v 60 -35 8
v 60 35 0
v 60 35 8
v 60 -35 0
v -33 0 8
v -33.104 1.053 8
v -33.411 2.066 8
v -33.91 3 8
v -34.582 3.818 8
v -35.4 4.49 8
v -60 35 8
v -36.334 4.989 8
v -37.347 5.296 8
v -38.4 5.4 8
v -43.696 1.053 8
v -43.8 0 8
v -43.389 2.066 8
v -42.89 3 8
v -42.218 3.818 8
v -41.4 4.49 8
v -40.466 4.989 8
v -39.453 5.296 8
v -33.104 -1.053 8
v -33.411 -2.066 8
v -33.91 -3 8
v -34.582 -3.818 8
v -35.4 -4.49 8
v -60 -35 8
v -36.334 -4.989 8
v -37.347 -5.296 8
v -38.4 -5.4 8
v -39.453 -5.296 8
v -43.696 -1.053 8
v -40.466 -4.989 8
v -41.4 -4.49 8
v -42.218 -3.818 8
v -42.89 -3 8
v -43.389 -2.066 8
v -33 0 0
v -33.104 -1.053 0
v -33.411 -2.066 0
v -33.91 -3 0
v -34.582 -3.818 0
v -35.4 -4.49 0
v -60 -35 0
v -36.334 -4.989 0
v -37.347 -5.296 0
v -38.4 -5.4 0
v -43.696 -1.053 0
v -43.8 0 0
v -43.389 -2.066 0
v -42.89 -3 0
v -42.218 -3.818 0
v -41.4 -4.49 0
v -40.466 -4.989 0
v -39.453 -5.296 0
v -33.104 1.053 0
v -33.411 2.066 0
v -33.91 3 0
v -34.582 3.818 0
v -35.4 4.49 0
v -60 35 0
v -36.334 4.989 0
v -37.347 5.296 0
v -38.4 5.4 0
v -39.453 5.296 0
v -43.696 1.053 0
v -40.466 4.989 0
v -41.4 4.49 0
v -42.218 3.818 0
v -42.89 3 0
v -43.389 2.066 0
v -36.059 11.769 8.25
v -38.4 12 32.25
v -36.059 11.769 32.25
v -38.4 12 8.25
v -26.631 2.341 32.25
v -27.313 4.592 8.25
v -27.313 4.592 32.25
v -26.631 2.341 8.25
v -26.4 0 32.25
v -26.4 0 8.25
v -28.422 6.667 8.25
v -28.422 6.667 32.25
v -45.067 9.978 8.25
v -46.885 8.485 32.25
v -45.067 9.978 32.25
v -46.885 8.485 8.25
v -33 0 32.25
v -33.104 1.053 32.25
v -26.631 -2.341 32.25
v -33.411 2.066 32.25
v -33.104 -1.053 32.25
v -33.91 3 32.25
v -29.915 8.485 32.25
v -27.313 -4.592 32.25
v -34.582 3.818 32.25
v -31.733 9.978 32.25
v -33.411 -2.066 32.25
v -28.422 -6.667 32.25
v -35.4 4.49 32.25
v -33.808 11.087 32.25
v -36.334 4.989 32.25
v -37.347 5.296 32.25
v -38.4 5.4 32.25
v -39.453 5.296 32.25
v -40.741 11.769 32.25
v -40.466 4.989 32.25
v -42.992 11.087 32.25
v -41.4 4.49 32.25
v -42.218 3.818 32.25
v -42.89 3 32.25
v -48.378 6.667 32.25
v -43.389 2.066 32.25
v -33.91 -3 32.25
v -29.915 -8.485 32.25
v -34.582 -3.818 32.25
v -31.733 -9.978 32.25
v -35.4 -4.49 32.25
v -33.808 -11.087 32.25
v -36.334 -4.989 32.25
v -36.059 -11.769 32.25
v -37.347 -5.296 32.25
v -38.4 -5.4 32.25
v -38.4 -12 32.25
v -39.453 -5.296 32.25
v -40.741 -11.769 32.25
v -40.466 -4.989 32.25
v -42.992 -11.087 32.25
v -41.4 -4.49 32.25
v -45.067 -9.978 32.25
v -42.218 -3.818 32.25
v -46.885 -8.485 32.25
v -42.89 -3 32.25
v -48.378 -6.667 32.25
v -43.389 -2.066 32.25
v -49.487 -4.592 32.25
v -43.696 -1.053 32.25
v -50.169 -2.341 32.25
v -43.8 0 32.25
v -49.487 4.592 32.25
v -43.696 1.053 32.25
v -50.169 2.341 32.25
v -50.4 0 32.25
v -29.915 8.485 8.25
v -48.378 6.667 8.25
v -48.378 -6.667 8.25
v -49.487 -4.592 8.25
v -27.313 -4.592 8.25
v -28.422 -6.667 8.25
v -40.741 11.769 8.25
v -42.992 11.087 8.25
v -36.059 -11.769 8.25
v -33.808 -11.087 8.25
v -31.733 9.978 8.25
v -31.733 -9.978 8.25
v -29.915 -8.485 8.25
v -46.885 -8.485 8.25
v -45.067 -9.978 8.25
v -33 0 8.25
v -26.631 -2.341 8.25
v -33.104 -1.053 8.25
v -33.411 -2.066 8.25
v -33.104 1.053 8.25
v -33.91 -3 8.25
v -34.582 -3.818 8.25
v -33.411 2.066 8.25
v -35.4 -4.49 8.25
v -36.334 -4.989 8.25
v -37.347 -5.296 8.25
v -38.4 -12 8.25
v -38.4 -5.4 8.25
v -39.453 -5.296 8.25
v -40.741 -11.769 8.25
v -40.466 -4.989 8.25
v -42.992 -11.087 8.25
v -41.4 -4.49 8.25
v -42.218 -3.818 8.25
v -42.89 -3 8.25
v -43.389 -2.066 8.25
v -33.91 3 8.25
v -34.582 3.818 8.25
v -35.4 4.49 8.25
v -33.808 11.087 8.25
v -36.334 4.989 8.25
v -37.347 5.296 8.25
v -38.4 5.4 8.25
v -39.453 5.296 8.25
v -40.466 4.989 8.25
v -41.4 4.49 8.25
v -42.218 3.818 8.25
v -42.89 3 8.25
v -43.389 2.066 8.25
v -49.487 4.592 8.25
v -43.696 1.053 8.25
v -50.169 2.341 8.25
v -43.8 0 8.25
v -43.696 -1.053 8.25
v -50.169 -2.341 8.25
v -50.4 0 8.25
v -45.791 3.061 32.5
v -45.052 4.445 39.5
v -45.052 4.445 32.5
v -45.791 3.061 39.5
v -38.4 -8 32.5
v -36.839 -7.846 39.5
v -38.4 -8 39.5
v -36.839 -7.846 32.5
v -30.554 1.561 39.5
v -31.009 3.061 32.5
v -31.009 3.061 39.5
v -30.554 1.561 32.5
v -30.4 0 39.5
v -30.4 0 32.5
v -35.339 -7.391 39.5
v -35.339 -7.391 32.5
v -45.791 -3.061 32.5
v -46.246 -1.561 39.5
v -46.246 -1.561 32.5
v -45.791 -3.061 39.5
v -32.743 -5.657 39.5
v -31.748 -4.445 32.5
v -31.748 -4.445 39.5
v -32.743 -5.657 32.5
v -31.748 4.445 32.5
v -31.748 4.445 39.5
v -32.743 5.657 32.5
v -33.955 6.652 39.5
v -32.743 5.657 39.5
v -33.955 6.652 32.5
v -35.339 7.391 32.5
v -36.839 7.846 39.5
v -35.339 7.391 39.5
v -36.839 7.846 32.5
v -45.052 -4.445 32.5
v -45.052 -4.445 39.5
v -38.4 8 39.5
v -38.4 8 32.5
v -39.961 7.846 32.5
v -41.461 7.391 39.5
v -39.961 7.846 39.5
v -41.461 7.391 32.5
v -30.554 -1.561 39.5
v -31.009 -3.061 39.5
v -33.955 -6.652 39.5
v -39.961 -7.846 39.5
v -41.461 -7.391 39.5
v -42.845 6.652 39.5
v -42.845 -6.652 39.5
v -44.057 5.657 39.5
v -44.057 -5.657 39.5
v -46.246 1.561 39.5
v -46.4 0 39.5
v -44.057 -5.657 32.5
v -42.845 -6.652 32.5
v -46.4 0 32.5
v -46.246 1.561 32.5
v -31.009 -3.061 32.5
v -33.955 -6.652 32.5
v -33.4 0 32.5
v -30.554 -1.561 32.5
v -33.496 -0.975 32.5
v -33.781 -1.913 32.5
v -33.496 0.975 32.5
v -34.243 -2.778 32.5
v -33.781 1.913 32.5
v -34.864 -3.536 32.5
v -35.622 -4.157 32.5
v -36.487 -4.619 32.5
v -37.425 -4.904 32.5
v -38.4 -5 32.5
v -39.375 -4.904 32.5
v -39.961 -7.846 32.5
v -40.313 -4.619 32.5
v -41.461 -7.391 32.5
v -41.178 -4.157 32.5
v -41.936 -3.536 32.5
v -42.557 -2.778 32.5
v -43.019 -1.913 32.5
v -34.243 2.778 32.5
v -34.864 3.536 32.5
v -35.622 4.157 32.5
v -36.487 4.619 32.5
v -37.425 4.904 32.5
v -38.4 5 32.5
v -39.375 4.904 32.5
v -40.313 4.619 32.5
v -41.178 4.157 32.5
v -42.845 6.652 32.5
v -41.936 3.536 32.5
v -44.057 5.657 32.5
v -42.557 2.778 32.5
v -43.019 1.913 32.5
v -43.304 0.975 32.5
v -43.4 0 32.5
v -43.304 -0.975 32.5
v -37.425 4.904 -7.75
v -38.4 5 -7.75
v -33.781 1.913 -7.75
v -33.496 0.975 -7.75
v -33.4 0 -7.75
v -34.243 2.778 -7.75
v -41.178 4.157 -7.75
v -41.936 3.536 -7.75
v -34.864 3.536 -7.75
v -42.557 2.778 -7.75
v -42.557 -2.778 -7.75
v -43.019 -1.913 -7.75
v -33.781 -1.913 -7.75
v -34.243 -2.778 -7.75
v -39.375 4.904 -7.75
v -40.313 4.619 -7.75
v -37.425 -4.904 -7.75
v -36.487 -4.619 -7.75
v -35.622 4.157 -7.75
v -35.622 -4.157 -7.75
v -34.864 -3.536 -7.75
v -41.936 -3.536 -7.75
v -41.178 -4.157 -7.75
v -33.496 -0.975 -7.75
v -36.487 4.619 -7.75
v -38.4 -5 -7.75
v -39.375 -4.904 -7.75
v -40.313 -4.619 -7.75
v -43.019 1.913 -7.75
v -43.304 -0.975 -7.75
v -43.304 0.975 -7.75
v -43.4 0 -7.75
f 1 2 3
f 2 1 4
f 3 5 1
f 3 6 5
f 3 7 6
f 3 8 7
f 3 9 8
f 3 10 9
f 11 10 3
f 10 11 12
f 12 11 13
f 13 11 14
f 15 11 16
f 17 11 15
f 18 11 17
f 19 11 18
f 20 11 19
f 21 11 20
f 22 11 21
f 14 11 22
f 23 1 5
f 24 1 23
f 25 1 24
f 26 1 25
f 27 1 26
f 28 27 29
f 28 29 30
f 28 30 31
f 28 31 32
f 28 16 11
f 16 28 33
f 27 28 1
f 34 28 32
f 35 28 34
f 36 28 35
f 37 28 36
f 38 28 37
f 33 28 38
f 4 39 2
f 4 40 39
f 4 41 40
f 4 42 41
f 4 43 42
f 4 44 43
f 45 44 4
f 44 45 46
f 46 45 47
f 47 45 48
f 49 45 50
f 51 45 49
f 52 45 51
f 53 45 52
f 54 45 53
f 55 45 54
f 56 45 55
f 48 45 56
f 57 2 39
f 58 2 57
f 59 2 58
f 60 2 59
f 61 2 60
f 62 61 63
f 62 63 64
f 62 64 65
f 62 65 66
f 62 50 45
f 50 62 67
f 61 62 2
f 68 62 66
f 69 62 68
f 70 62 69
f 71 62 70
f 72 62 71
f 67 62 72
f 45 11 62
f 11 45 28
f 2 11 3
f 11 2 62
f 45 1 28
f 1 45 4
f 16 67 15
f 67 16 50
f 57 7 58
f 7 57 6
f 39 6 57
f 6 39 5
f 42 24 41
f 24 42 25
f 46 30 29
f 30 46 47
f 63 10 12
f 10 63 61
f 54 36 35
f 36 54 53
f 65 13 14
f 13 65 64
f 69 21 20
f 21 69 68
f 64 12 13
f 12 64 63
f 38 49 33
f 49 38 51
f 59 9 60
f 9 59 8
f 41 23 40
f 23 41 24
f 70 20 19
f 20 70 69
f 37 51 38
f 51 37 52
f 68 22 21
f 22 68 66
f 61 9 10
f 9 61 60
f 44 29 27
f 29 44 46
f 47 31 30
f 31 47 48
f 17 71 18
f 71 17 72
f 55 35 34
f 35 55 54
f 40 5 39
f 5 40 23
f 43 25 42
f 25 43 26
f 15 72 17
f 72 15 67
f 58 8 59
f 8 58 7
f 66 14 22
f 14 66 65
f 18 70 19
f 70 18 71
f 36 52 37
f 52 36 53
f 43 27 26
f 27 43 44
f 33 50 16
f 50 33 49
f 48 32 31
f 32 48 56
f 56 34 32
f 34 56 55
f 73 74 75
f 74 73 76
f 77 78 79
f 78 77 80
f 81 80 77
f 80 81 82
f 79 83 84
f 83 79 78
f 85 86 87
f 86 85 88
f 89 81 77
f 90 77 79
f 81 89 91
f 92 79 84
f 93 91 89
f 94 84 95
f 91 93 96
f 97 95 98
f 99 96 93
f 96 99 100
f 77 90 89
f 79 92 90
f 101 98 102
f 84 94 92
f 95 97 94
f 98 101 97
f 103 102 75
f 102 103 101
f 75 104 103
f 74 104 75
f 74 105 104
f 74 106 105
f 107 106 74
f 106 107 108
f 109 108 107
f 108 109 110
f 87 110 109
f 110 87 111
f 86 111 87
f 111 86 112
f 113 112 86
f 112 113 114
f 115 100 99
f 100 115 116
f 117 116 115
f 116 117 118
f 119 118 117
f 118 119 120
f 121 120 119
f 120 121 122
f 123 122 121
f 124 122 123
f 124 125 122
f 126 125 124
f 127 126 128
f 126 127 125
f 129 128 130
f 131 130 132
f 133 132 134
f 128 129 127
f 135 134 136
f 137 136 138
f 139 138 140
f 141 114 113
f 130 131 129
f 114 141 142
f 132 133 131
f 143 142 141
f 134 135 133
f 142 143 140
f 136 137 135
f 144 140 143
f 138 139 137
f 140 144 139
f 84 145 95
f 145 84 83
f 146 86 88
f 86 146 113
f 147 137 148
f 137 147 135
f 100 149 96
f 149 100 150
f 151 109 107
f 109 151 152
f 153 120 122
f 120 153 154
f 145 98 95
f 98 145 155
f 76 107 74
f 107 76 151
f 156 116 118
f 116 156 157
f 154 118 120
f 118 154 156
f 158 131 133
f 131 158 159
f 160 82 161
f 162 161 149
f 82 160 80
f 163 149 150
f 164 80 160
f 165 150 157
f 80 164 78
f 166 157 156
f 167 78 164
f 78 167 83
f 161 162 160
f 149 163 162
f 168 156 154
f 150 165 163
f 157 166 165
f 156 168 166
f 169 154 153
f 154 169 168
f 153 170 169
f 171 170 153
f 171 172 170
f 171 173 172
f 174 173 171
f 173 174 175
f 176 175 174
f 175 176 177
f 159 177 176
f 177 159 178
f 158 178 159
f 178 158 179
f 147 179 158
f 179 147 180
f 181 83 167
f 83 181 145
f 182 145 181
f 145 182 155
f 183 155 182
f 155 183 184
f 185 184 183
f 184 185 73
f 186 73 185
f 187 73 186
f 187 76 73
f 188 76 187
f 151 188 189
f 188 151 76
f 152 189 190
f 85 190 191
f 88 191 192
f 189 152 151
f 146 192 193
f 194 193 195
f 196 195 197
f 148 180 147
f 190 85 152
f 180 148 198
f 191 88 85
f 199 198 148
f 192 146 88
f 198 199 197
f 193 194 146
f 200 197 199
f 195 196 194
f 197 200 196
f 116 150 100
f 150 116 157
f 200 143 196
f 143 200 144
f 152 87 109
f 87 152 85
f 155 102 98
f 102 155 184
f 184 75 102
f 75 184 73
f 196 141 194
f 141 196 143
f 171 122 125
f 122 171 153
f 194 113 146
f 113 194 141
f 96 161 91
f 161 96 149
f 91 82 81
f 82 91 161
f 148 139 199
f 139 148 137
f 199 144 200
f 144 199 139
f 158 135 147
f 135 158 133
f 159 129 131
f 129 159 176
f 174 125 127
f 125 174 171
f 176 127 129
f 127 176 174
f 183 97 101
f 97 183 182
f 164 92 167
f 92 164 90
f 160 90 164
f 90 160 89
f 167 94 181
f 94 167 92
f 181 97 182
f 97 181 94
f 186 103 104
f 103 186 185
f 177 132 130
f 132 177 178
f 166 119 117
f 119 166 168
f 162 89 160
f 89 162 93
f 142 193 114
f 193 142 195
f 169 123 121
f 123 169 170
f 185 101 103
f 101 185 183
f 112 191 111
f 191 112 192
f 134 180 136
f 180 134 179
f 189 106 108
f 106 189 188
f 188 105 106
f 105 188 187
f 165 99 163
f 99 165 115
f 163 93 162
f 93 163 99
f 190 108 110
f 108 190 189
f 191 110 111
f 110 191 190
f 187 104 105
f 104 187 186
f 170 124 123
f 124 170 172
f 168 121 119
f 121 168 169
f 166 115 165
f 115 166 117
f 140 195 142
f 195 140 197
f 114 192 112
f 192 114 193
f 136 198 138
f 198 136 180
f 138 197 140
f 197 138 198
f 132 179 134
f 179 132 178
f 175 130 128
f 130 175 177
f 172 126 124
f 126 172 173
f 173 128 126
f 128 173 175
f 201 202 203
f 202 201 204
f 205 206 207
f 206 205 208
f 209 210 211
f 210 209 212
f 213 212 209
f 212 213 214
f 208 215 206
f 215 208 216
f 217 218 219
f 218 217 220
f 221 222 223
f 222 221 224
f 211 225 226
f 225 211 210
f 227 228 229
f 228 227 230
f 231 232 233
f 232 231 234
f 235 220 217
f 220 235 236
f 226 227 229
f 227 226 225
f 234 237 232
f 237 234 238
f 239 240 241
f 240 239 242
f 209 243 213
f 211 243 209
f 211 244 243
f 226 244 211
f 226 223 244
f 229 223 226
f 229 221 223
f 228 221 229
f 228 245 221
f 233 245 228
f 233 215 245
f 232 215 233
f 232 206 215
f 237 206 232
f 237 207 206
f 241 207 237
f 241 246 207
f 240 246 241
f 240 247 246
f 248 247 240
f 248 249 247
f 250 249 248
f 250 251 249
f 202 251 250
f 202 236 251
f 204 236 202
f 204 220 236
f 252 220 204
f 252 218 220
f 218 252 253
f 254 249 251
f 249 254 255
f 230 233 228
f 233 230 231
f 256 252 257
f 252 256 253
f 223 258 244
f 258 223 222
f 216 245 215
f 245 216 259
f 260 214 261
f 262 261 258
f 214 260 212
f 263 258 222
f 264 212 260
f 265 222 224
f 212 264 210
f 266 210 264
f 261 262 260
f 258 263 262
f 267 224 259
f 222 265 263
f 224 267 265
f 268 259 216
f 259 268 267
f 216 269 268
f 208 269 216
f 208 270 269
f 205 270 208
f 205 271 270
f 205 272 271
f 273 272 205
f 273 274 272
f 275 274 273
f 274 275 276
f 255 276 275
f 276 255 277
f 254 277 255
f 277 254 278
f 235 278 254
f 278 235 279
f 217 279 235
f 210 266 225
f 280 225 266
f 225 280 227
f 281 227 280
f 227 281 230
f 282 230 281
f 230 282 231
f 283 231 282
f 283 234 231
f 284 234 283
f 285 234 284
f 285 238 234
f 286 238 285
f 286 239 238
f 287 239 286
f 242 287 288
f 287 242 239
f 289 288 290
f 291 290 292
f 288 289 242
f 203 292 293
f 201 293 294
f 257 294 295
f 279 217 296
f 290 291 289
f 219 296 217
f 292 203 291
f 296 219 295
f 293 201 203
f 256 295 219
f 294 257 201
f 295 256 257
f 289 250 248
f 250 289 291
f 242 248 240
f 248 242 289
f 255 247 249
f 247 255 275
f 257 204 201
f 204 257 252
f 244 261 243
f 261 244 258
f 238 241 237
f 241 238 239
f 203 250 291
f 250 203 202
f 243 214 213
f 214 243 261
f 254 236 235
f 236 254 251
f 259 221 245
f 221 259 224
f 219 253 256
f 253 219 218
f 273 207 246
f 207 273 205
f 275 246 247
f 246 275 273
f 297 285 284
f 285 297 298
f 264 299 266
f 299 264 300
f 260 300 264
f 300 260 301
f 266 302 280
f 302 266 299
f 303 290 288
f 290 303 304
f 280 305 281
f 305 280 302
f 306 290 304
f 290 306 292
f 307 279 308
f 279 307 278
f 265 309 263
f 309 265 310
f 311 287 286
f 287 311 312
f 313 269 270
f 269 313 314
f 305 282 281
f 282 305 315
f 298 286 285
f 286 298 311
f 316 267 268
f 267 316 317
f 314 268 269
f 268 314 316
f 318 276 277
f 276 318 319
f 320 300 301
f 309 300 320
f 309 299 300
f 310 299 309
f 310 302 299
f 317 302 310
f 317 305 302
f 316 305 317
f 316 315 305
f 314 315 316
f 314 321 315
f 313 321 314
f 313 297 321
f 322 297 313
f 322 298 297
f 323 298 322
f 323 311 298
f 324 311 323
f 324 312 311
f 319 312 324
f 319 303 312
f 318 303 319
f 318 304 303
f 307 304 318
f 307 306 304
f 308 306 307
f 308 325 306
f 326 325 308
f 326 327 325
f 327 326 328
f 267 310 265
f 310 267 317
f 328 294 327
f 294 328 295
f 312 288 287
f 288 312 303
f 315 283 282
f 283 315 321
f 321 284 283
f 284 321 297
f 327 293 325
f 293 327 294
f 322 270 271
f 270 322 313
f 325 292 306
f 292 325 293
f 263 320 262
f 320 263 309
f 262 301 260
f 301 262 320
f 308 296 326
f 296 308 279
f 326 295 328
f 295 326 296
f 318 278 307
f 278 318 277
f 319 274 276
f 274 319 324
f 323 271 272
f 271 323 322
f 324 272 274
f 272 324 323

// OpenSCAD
$fn = 32;

// ------------------------------------------------------------------------
// Standoff columns: 1 d24 standoffs, bolts d10
// Every part is its own module, assembly() places them once.
// ------------------------------------------------------------------------

// --- part 1 ---
module base_plate() {
  difference() {
    translate([-60, -35, 0]) cube([120, 70, 8]);
    translate([-38.4, 0, -1]) cylinder(h = 10, d = 10.8);
  }
}

// --- part 2 ---
module spacer() {
  difference() {
      translate([0, 0, 0]) cylinder(h = 24, d = 24);
      translate([0, 0, -1]) cylinder(h = 26, d = 10.8);
    }
}

// --- part 3 ---
module bolt() {
  cylinder(h = 7, d = 16);
  translate([0, 0, -40.25]) cylinder(h = 40.25, d = 10);
}

// --- assembly ---
module assembly() {
  translate([0, 0, 0]) rotate([0, 0, 0]) base_plate();
  translate([-38.4, 0, 8.25]) rotate([0, 0, 0]) spacer();
  translate([-38.4, 0, 32.5]) rotate([0, 0, 0]) bolt();
}

assembly();
